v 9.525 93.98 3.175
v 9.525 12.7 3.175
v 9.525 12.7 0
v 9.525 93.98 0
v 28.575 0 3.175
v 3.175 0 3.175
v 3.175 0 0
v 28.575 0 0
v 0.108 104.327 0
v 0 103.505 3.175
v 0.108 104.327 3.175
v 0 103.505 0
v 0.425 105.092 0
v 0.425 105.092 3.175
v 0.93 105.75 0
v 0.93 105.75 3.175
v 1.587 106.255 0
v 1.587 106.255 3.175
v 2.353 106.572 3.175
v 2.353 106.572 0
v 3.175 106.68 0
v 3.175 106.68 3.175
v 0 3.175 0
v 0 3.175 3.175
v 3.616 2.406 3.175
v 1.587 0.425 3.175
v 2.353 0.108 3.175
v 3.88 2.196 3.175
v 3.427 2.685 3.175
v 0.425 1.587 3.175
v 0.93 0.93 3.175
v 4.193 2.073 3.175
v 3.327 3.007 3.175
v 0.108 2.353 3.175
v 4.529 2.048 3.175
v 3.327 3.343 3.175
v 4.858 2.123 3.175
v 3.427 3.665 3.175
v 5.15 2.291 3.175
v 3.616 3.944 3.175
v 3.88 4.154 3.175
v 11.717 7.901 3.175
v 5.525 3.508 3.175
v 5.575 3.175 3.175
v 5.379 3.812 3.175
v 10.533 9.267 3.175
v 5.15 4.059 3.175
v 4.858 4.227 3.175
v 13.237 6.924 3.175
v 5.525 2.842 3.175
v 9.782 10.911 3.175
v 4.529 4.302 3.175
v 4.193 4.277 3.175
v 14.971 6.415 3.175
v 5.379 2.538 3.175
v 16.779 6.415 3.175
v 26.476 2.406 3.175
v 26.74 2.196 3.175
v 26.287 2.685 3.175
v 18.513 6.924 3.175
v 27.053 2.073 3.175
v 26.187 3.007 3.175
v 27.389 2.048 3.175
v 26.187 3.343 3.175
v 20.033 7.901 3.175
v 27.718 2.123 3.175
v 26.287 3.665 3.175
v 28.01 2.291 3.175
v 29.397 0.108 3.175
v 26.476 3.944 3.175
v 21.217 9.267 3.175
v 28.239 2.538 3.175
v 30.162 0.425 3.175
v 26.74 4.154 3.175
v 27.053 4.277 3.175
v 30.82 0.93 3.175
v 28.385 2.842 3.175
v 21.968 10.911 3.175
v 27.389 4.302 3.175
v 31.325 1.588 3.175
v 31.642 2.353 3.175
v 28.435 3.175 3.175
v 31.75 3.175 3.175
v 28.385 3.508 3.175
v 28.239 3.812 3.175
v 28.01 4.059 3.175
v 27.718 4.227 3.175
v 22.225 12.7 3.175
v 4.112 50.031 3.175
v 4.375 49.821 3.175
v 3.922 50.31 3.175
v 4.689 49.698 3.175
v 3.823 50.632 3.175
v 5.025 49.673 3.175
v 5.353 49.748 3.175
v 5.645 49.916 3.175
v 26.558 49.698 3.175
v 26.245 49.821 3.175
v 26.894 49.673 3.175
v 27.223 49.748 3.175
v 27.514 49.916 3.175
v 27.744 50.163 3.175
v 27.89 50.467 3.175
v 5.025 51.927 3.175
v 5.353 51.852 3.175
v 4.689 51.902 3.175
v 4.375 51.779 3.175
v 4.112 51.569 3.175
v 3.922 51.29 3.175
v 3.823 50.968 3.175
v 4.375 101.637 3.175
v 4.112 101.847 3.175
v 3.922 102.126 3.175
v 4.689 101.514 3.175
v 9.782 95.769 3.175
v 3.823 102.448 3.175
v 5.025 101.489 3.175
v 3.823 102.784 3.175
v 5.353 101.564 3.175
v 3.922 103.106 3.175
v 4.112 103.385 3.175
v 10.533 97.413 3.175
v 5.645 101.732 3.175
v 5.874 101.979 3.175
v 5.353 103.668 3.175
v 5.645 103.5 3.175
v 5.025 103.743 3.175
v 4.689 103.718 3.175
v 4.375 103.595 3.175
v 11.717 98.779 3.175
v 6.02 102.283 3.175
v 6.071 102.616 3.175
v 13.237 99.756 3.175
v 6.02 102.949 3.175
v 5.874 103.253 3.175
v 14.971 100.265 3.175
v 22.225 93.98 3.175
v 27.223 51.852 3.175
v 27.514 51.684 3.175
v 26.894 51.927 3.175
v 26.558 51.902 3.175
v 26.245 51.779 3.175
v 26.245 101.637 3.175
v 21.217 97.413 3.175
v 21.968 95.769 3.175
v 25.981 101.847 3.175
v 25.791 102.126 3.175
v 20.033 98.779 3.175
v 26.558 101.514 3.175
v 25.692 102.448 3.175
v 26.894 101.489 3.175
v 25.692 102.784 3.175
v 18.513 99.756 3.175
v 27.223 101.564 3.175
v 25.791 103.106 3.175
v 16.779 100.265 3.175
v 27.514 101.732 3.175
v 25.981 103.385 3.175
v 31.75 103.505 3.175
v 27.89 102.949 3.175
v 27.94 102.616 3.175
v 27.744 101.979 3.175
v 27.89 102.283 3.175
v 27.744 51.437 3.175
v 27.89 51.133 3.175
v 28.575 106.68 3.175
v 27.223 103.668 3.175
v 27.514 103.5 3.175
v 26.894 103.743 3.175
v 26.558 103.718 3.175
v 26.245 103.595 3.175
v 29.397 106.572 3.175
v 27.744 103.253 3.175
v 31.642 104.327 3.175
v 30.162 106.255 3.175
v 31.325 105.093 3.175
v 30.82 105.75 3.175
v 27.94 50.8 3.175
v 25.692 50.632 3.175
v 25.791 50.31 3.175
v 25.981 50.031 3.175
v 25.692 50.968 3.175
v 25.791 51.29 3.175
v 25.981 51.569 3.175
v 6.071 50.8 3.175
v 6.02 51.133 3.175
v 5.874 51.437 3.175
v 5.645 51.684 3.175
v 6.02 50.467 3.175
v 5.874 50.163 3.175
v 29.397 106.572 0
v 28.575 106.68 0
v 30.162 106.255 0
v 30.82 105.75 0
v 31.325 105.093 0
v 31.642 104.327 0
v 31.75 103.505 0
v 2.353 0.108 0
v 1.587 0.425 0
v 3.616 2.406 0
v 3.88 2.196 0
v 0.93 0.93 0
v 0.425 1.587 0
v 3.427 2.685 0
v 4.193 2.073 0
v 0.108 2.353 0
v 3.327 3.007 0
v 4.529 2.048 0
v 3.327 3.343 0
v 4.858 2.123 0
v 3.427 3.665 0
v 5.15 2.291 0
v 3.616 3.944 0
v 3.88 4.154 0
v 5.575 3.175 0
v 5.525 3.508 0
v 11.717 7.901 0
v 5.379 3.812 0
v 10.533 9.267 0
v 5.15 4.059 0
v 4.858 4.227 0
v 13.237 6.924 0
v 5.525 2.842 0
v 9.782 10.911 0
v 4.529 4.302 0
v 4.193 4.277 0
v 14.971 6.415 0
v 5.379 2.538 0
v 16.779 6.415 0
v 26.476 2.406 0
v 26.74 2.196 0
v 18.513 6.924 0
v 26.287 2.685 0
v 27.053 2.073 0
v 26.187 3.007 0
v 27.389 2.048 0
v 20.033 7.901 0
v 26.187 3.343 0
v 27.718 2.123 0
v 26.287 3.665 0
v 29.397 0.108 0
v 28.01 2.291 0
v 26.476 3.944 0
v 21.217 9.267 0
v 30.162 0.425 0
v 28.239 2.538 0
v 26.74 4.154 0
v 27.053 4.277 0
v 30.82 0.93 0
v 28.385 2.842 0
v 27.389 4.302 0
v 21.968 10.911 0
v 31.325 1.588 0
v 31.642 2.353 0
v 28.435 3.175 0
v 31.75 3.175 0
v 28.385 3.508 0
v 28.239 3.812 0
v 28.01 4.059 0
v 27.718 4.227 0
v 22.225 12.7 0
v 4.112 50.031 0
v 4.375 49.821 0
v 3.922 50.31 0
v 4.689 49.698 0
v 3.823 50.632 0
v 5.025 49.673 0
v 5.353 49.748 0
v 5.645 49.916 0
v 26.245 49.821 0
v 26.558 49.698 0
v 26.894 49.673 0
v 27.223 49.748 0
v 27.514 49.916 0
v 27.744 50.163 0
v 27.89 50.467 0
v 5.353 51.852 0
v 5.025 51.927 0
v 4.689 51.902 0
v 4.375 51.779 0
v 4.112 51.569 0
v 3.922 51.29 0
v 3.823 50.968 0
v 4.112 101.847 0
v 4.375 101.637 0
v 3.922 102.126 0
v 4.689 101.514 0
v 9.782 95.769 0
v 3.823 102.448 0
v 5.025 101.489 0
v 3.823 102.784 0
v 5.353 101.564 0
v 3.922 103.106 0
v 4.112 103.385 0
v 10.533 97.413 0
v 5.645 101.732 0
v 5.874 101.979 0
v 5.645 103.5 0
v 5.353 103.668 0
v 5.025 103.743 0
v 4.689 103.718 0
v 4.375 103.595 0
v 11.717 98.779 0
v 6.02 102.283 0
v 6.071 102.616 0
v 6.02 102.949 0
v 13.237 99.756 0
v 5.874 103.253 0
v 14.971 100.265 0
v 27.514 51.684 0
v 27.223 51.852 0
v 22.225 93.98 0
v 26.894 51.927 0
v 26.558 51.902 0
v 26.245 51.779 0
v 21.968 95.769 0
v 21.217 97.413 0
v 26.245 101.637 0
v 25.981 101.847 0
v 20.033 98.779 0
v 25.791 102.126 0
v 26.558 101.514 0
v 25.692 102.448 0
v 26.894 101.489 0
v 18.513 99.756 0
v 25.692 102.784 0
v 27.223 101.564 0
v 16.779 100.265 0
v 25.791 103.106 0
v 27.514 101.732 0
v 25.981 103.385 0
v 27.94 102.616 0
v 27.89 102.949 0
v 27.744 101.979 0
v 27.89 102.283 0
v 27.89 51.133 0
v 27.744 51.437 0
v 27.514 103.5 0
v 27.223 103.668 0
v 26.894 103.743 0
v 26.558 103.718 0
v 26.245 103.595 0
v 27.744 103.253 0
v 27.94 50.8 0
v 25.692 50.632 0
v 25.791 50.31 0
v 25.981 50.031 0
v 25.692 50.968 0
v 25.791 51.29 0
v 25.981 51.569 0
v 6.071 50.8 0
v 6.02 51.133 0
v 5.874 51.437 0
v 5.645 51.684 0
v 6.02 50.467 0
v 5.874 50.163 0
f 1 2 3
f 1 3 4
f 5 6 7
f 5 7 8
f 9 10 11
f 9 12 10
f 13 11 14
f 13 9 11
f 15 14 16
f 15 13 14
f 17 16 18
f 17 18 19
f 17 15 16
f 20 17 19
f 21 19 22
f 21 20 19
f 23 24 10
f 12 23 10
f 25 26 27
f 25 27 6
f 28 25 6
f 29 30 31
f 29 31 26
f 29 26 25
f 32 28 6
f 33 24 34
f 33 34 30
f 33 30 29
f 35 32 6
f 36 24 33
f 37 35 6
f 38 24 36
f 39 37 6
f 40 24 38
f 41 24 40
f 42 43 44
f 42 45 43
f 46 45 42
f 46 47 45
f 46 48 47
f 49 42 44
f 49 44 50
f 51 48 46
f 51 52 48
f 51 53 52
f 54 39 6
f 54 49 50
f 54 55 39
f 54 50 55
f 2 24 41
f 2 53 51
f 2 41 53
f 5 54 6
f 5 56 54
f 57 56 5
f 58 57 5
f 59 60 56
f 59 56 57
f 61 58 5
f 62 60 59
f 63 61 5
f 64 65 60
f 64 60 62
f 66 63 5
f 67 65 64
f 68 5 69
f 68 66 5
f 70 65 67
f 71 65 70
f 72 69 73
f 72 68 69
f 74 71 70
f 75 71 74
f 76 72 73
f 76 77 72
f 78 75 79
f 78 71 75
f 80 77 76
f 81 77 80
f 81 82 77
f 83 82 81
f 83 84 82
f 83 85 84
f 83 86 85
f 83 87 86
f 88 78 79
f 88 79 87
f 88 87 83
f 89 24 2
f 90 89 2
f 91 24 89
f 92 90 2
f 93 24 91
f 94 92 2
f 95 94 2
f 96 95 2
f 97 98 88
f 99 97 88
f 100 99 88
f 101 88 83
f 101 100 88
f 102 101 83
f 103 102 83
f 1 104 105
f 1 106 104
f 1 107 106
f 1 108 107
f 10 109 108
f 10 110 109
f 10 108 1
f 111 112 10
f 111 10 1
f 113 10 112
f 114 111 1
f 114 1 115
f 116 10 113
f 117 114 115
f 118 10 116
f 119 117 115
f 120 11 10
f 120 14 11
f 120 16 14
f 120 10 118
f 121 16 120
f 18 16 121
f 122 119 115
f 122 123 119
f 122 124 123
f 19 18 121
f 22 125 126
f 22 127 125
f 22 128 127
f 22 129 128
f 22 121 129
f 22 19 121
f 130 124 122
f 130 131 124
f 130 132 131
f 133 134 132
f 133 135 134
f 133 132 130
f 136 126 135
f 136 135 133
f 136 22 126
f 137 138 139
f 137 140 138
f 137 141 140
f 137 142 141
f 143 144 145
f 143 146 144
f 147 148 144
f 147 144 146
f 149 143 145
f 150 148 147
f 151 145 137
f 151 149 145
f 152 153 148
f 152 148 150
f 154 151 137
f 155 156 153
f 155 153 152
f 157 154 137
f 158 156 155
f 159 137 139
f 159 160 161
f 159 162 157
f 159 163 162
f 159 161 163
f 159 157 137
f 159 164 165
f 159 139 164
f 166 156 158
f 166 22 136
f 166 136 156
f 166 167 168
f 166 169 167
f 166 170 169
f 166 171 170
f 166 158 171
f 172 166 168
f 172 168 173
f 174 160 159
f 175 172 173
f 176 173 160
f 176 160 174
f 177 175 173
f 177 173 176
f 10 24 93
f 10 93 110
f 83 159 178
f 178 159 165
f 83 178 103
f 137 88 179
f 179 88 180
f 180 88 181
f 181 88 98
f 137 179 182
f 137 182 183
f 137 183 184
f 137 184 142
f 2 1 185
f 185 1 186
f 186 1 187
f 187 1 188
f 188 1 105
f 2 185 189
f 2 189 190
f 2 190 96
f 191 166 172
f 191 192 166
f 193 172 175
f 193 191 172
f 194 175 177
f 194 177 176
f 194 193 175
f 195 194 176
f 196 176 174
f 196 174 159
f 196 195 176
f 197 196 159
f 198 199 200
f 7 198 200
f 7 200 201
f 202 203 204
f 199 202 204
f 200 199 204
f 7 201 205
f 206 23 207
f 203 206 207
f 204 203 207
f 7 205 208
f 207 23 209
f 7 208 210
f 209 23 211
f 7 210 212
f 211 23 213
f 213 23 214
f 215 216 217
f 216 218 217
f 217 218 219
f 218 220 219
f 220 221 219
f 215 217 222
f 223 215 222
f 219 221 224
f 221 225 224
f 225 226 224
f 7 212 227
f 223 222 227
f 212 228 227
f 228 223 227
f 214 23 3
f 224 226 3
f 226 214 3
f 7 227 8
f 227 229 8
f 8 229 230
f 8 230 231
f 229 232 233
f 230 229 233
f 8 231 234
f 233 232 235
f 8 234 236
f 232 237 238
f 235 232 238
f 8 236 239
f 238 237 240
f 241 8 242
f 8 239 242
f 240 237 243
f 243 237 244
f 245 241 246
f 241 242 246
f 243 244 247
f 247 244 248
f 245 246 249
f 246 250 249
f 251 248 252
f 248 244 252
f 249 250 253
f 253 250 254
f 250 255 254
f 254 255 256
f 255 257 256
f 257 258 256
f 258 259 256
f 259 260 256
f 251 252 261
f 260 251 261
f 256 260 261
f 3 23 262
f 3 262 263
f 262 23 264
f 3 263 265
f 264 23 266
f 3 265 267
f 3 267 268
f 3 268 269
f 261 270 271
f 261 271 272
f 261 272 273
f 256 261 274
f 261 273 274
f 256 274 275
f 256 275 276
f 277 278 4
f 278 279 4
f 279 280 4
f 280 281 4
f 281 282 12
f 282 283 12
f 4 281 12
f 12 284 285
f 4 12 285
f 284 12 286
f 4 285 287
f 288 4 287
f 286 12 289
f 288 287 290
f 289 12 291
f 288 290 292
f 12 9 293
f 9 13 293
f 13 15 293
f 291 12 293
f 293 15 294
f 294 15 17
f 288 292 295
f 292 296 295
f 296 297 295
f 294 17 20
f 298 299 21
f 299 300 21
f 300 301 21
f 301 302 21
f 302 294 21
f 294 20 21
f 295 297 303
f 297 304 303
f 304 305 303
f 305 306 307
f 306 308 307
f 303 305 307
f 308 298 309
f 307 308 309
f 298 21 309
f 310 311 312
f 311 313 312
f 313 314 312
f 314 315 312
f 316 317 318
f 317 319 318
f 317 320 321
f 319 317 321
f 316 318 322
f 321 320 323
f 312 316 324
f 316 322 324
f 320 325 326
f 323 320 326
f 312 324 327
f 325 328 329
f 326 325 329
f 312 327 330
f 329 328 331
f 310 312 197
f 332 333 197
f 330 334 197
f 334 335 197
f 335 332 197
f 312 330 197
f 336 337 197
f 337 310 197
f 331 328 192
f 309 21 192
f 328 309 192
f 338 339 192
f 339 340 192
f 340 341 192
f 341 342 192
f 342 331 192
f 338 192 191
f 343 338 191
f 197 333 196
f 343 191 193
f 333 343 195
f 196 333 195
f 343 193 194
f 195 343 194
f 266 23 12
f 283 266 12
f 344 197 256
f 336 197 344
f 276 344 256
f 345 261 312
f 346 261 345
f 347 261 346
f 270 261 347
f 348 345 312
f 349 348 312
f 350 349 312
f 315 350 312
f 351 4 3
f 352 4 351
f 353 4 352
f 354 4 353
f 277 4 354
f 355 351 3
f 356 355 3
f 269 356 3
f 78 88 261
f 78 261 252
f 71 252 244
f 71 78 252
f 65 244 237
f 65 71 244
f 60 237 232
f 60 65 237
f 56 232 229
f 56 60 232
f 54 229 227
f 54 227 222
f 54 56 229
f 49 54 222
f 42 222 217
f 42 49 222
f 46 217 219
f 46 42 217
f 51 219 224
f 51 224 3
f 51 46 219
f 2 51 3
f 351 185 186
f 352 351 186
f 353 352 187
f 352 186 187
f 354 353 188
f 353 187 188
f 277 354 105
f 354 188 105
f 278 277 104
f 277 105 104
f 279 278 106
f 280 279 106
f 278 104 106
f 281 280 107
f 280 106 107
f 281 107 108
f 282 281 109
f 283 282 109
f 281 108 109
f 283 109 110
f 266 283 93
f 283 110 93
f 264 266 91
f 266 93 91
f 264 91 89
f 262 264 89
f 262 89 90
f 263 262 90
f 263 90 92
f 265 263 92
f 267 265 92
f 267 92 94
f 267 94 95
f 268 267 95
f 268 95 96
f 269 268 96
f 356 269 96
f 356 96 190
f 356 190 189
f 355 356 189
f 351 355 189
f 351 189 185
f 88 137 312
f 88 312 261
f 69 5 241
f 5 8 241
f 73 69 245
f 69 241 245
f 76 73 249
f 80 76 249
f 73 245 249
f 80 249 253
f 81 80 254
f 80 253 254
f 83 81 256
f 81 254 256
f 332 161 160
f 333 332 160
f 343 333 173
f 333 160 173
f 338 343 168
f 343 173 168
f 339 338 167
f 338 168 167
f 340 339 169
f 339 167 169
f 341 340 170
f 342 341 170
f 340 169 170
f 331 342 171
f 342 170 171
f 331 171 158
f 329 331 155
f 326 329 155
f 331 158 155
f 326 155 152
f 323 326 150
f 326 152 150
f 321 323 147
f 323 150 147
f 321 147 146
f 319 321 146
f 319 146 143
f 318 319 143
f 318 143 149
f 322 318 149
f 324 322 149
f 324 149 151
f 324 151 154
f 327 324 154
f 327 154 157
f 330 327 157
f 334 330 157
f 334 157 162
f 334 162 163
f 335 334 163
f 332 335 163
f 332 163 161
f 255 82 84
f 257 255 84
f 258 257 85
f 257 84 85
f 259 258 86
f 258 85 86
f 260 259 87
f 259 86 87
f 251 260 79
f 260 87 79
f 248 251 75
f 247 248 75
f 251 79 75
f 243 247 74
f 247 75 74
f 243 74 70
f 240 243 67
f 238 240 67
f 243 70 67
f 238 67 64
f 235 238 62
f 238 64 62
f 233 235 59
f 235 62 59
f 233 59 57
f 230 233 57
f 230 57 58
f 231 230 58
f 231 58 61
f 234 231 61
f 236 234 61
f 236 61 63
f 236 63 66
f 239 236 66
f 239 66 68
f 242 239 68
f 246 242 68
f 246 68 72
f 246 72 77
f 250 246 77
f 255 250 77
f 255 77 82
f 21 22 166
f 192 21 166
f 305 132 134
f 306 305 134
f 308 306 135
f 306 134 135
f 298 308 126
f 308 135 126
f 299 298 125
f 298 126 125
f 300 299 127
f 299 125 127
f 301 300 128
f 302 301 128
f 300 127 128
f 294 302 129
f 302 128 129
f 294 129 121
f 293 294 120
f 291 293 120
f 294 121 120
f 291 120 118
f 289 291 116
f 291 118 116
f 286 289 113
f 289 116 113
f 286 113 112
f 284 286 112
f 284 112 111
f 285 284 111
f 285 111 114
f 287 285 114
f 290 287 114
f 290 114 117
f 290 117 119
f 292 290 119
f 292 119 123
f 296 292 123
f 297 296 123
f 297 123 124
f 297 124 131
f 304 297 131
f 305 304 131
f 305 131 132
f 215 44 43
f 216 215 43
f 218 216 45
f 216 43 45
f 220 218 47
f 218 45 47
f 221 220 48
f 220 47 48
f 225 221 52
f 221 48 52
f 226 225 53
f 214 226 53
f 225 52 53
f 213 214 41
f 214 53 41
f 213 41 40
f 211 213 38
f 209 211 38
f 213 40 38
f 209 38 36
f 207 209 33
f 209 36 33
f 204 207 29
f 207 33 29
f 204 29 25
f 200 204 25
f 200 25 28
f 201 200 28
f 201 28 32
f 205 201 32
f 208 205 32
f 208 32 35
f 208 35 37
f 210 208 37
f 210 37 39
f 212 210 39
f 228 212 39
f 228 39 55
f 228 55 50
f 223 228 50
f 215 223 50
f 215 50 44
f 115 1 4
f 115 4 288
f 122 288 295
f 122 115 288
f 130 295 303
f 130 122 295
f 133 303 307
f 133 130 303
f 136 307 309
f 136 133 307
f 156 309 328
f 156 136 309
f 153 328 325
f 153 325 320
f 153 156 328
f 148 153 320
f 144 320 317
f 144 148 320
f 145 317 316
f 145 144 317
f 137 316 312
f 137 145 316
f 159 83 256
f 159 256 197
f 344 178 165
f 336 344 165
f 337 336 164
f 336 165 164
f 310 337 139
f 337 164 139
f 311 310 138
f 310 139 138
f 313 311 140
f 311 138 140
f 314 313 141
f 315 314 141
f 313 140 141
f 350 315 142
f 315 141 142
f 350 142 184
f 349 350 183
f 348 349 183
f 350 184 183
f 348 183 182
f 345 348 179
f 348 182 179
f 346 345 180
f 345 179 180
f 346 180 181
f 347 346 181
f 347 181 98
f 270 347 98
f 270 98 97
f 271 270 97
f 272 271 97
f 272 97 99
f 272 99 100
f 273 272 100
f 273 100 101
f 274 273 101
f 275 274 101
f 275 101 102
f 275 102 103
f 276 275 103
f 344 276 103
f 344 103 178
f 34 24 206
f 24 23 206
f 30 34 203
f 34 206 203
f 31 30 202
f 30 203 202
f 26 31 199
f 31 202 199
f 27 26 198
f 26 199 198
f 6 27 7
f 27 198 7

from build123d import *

# Parameters (mm, degrees)
SKETCH1_W             = 31.75
SKETCH1_H             = 106.68
BOSS_EXTRUDE1_DEPTH   = 3.175
FILLET1_R             = 3.175
F_4_40_TAPPED_HOLE1_D = 2.2606


with BuildPart() as part:
    # Sketch1 → Boss-Extrude1 (new body)
    with BuildSketch(Plane.XY.offset(3.175)):
        with Locations((15.875, 53.34)):
            Rectangle(SKETCH1_W, SKETCH1_H)
        with BuildLine():
            Line((22.225, 93.98), (22.225, 12.7))
            ThreePointArc((22.225, 12.7), (15.875, 6.35), (9.525, 12.7))
            Line((9.525, 12.7), (9.525, 93.98))
            ThreePointArc((9.525, 93.98), (15.875, 100.33), (22.225, 93.98))
        make_face(mode=Mode.SUBTRACT)
    extrude(amount=-BOSS_EXTRUDE1_DEPTH)

    # Fillet1
    fillet1_edges = [part.edges().sort_by_distance(p)[0] for p in [
        (0, 0, 1.5875),
        (0, 106.68, 1.5875),
        (31.75, 106.68, 1.5875),
        (31.75, 0, 1.5875),
    ]]
    fillet(fillet1_edges, radius=FILLET1_R)

    # #4-40 Tapped Hole1 (through all)
    with Locations(Plane(origin=(0, 0, 0), x_dir=(-1, 0, 0), z_dir=(0, 0, -1))):
        with Locations((-4.445, 3.175), (-4.9403, 50.8), (-27.305, 3.175), (-26.8097, 50.8), (-26.8097, 102.616), (-4.9403, 102.616)):
            Hole(F_4_40_TAPPED_HOLE1_D / 2)


solid = part.part
